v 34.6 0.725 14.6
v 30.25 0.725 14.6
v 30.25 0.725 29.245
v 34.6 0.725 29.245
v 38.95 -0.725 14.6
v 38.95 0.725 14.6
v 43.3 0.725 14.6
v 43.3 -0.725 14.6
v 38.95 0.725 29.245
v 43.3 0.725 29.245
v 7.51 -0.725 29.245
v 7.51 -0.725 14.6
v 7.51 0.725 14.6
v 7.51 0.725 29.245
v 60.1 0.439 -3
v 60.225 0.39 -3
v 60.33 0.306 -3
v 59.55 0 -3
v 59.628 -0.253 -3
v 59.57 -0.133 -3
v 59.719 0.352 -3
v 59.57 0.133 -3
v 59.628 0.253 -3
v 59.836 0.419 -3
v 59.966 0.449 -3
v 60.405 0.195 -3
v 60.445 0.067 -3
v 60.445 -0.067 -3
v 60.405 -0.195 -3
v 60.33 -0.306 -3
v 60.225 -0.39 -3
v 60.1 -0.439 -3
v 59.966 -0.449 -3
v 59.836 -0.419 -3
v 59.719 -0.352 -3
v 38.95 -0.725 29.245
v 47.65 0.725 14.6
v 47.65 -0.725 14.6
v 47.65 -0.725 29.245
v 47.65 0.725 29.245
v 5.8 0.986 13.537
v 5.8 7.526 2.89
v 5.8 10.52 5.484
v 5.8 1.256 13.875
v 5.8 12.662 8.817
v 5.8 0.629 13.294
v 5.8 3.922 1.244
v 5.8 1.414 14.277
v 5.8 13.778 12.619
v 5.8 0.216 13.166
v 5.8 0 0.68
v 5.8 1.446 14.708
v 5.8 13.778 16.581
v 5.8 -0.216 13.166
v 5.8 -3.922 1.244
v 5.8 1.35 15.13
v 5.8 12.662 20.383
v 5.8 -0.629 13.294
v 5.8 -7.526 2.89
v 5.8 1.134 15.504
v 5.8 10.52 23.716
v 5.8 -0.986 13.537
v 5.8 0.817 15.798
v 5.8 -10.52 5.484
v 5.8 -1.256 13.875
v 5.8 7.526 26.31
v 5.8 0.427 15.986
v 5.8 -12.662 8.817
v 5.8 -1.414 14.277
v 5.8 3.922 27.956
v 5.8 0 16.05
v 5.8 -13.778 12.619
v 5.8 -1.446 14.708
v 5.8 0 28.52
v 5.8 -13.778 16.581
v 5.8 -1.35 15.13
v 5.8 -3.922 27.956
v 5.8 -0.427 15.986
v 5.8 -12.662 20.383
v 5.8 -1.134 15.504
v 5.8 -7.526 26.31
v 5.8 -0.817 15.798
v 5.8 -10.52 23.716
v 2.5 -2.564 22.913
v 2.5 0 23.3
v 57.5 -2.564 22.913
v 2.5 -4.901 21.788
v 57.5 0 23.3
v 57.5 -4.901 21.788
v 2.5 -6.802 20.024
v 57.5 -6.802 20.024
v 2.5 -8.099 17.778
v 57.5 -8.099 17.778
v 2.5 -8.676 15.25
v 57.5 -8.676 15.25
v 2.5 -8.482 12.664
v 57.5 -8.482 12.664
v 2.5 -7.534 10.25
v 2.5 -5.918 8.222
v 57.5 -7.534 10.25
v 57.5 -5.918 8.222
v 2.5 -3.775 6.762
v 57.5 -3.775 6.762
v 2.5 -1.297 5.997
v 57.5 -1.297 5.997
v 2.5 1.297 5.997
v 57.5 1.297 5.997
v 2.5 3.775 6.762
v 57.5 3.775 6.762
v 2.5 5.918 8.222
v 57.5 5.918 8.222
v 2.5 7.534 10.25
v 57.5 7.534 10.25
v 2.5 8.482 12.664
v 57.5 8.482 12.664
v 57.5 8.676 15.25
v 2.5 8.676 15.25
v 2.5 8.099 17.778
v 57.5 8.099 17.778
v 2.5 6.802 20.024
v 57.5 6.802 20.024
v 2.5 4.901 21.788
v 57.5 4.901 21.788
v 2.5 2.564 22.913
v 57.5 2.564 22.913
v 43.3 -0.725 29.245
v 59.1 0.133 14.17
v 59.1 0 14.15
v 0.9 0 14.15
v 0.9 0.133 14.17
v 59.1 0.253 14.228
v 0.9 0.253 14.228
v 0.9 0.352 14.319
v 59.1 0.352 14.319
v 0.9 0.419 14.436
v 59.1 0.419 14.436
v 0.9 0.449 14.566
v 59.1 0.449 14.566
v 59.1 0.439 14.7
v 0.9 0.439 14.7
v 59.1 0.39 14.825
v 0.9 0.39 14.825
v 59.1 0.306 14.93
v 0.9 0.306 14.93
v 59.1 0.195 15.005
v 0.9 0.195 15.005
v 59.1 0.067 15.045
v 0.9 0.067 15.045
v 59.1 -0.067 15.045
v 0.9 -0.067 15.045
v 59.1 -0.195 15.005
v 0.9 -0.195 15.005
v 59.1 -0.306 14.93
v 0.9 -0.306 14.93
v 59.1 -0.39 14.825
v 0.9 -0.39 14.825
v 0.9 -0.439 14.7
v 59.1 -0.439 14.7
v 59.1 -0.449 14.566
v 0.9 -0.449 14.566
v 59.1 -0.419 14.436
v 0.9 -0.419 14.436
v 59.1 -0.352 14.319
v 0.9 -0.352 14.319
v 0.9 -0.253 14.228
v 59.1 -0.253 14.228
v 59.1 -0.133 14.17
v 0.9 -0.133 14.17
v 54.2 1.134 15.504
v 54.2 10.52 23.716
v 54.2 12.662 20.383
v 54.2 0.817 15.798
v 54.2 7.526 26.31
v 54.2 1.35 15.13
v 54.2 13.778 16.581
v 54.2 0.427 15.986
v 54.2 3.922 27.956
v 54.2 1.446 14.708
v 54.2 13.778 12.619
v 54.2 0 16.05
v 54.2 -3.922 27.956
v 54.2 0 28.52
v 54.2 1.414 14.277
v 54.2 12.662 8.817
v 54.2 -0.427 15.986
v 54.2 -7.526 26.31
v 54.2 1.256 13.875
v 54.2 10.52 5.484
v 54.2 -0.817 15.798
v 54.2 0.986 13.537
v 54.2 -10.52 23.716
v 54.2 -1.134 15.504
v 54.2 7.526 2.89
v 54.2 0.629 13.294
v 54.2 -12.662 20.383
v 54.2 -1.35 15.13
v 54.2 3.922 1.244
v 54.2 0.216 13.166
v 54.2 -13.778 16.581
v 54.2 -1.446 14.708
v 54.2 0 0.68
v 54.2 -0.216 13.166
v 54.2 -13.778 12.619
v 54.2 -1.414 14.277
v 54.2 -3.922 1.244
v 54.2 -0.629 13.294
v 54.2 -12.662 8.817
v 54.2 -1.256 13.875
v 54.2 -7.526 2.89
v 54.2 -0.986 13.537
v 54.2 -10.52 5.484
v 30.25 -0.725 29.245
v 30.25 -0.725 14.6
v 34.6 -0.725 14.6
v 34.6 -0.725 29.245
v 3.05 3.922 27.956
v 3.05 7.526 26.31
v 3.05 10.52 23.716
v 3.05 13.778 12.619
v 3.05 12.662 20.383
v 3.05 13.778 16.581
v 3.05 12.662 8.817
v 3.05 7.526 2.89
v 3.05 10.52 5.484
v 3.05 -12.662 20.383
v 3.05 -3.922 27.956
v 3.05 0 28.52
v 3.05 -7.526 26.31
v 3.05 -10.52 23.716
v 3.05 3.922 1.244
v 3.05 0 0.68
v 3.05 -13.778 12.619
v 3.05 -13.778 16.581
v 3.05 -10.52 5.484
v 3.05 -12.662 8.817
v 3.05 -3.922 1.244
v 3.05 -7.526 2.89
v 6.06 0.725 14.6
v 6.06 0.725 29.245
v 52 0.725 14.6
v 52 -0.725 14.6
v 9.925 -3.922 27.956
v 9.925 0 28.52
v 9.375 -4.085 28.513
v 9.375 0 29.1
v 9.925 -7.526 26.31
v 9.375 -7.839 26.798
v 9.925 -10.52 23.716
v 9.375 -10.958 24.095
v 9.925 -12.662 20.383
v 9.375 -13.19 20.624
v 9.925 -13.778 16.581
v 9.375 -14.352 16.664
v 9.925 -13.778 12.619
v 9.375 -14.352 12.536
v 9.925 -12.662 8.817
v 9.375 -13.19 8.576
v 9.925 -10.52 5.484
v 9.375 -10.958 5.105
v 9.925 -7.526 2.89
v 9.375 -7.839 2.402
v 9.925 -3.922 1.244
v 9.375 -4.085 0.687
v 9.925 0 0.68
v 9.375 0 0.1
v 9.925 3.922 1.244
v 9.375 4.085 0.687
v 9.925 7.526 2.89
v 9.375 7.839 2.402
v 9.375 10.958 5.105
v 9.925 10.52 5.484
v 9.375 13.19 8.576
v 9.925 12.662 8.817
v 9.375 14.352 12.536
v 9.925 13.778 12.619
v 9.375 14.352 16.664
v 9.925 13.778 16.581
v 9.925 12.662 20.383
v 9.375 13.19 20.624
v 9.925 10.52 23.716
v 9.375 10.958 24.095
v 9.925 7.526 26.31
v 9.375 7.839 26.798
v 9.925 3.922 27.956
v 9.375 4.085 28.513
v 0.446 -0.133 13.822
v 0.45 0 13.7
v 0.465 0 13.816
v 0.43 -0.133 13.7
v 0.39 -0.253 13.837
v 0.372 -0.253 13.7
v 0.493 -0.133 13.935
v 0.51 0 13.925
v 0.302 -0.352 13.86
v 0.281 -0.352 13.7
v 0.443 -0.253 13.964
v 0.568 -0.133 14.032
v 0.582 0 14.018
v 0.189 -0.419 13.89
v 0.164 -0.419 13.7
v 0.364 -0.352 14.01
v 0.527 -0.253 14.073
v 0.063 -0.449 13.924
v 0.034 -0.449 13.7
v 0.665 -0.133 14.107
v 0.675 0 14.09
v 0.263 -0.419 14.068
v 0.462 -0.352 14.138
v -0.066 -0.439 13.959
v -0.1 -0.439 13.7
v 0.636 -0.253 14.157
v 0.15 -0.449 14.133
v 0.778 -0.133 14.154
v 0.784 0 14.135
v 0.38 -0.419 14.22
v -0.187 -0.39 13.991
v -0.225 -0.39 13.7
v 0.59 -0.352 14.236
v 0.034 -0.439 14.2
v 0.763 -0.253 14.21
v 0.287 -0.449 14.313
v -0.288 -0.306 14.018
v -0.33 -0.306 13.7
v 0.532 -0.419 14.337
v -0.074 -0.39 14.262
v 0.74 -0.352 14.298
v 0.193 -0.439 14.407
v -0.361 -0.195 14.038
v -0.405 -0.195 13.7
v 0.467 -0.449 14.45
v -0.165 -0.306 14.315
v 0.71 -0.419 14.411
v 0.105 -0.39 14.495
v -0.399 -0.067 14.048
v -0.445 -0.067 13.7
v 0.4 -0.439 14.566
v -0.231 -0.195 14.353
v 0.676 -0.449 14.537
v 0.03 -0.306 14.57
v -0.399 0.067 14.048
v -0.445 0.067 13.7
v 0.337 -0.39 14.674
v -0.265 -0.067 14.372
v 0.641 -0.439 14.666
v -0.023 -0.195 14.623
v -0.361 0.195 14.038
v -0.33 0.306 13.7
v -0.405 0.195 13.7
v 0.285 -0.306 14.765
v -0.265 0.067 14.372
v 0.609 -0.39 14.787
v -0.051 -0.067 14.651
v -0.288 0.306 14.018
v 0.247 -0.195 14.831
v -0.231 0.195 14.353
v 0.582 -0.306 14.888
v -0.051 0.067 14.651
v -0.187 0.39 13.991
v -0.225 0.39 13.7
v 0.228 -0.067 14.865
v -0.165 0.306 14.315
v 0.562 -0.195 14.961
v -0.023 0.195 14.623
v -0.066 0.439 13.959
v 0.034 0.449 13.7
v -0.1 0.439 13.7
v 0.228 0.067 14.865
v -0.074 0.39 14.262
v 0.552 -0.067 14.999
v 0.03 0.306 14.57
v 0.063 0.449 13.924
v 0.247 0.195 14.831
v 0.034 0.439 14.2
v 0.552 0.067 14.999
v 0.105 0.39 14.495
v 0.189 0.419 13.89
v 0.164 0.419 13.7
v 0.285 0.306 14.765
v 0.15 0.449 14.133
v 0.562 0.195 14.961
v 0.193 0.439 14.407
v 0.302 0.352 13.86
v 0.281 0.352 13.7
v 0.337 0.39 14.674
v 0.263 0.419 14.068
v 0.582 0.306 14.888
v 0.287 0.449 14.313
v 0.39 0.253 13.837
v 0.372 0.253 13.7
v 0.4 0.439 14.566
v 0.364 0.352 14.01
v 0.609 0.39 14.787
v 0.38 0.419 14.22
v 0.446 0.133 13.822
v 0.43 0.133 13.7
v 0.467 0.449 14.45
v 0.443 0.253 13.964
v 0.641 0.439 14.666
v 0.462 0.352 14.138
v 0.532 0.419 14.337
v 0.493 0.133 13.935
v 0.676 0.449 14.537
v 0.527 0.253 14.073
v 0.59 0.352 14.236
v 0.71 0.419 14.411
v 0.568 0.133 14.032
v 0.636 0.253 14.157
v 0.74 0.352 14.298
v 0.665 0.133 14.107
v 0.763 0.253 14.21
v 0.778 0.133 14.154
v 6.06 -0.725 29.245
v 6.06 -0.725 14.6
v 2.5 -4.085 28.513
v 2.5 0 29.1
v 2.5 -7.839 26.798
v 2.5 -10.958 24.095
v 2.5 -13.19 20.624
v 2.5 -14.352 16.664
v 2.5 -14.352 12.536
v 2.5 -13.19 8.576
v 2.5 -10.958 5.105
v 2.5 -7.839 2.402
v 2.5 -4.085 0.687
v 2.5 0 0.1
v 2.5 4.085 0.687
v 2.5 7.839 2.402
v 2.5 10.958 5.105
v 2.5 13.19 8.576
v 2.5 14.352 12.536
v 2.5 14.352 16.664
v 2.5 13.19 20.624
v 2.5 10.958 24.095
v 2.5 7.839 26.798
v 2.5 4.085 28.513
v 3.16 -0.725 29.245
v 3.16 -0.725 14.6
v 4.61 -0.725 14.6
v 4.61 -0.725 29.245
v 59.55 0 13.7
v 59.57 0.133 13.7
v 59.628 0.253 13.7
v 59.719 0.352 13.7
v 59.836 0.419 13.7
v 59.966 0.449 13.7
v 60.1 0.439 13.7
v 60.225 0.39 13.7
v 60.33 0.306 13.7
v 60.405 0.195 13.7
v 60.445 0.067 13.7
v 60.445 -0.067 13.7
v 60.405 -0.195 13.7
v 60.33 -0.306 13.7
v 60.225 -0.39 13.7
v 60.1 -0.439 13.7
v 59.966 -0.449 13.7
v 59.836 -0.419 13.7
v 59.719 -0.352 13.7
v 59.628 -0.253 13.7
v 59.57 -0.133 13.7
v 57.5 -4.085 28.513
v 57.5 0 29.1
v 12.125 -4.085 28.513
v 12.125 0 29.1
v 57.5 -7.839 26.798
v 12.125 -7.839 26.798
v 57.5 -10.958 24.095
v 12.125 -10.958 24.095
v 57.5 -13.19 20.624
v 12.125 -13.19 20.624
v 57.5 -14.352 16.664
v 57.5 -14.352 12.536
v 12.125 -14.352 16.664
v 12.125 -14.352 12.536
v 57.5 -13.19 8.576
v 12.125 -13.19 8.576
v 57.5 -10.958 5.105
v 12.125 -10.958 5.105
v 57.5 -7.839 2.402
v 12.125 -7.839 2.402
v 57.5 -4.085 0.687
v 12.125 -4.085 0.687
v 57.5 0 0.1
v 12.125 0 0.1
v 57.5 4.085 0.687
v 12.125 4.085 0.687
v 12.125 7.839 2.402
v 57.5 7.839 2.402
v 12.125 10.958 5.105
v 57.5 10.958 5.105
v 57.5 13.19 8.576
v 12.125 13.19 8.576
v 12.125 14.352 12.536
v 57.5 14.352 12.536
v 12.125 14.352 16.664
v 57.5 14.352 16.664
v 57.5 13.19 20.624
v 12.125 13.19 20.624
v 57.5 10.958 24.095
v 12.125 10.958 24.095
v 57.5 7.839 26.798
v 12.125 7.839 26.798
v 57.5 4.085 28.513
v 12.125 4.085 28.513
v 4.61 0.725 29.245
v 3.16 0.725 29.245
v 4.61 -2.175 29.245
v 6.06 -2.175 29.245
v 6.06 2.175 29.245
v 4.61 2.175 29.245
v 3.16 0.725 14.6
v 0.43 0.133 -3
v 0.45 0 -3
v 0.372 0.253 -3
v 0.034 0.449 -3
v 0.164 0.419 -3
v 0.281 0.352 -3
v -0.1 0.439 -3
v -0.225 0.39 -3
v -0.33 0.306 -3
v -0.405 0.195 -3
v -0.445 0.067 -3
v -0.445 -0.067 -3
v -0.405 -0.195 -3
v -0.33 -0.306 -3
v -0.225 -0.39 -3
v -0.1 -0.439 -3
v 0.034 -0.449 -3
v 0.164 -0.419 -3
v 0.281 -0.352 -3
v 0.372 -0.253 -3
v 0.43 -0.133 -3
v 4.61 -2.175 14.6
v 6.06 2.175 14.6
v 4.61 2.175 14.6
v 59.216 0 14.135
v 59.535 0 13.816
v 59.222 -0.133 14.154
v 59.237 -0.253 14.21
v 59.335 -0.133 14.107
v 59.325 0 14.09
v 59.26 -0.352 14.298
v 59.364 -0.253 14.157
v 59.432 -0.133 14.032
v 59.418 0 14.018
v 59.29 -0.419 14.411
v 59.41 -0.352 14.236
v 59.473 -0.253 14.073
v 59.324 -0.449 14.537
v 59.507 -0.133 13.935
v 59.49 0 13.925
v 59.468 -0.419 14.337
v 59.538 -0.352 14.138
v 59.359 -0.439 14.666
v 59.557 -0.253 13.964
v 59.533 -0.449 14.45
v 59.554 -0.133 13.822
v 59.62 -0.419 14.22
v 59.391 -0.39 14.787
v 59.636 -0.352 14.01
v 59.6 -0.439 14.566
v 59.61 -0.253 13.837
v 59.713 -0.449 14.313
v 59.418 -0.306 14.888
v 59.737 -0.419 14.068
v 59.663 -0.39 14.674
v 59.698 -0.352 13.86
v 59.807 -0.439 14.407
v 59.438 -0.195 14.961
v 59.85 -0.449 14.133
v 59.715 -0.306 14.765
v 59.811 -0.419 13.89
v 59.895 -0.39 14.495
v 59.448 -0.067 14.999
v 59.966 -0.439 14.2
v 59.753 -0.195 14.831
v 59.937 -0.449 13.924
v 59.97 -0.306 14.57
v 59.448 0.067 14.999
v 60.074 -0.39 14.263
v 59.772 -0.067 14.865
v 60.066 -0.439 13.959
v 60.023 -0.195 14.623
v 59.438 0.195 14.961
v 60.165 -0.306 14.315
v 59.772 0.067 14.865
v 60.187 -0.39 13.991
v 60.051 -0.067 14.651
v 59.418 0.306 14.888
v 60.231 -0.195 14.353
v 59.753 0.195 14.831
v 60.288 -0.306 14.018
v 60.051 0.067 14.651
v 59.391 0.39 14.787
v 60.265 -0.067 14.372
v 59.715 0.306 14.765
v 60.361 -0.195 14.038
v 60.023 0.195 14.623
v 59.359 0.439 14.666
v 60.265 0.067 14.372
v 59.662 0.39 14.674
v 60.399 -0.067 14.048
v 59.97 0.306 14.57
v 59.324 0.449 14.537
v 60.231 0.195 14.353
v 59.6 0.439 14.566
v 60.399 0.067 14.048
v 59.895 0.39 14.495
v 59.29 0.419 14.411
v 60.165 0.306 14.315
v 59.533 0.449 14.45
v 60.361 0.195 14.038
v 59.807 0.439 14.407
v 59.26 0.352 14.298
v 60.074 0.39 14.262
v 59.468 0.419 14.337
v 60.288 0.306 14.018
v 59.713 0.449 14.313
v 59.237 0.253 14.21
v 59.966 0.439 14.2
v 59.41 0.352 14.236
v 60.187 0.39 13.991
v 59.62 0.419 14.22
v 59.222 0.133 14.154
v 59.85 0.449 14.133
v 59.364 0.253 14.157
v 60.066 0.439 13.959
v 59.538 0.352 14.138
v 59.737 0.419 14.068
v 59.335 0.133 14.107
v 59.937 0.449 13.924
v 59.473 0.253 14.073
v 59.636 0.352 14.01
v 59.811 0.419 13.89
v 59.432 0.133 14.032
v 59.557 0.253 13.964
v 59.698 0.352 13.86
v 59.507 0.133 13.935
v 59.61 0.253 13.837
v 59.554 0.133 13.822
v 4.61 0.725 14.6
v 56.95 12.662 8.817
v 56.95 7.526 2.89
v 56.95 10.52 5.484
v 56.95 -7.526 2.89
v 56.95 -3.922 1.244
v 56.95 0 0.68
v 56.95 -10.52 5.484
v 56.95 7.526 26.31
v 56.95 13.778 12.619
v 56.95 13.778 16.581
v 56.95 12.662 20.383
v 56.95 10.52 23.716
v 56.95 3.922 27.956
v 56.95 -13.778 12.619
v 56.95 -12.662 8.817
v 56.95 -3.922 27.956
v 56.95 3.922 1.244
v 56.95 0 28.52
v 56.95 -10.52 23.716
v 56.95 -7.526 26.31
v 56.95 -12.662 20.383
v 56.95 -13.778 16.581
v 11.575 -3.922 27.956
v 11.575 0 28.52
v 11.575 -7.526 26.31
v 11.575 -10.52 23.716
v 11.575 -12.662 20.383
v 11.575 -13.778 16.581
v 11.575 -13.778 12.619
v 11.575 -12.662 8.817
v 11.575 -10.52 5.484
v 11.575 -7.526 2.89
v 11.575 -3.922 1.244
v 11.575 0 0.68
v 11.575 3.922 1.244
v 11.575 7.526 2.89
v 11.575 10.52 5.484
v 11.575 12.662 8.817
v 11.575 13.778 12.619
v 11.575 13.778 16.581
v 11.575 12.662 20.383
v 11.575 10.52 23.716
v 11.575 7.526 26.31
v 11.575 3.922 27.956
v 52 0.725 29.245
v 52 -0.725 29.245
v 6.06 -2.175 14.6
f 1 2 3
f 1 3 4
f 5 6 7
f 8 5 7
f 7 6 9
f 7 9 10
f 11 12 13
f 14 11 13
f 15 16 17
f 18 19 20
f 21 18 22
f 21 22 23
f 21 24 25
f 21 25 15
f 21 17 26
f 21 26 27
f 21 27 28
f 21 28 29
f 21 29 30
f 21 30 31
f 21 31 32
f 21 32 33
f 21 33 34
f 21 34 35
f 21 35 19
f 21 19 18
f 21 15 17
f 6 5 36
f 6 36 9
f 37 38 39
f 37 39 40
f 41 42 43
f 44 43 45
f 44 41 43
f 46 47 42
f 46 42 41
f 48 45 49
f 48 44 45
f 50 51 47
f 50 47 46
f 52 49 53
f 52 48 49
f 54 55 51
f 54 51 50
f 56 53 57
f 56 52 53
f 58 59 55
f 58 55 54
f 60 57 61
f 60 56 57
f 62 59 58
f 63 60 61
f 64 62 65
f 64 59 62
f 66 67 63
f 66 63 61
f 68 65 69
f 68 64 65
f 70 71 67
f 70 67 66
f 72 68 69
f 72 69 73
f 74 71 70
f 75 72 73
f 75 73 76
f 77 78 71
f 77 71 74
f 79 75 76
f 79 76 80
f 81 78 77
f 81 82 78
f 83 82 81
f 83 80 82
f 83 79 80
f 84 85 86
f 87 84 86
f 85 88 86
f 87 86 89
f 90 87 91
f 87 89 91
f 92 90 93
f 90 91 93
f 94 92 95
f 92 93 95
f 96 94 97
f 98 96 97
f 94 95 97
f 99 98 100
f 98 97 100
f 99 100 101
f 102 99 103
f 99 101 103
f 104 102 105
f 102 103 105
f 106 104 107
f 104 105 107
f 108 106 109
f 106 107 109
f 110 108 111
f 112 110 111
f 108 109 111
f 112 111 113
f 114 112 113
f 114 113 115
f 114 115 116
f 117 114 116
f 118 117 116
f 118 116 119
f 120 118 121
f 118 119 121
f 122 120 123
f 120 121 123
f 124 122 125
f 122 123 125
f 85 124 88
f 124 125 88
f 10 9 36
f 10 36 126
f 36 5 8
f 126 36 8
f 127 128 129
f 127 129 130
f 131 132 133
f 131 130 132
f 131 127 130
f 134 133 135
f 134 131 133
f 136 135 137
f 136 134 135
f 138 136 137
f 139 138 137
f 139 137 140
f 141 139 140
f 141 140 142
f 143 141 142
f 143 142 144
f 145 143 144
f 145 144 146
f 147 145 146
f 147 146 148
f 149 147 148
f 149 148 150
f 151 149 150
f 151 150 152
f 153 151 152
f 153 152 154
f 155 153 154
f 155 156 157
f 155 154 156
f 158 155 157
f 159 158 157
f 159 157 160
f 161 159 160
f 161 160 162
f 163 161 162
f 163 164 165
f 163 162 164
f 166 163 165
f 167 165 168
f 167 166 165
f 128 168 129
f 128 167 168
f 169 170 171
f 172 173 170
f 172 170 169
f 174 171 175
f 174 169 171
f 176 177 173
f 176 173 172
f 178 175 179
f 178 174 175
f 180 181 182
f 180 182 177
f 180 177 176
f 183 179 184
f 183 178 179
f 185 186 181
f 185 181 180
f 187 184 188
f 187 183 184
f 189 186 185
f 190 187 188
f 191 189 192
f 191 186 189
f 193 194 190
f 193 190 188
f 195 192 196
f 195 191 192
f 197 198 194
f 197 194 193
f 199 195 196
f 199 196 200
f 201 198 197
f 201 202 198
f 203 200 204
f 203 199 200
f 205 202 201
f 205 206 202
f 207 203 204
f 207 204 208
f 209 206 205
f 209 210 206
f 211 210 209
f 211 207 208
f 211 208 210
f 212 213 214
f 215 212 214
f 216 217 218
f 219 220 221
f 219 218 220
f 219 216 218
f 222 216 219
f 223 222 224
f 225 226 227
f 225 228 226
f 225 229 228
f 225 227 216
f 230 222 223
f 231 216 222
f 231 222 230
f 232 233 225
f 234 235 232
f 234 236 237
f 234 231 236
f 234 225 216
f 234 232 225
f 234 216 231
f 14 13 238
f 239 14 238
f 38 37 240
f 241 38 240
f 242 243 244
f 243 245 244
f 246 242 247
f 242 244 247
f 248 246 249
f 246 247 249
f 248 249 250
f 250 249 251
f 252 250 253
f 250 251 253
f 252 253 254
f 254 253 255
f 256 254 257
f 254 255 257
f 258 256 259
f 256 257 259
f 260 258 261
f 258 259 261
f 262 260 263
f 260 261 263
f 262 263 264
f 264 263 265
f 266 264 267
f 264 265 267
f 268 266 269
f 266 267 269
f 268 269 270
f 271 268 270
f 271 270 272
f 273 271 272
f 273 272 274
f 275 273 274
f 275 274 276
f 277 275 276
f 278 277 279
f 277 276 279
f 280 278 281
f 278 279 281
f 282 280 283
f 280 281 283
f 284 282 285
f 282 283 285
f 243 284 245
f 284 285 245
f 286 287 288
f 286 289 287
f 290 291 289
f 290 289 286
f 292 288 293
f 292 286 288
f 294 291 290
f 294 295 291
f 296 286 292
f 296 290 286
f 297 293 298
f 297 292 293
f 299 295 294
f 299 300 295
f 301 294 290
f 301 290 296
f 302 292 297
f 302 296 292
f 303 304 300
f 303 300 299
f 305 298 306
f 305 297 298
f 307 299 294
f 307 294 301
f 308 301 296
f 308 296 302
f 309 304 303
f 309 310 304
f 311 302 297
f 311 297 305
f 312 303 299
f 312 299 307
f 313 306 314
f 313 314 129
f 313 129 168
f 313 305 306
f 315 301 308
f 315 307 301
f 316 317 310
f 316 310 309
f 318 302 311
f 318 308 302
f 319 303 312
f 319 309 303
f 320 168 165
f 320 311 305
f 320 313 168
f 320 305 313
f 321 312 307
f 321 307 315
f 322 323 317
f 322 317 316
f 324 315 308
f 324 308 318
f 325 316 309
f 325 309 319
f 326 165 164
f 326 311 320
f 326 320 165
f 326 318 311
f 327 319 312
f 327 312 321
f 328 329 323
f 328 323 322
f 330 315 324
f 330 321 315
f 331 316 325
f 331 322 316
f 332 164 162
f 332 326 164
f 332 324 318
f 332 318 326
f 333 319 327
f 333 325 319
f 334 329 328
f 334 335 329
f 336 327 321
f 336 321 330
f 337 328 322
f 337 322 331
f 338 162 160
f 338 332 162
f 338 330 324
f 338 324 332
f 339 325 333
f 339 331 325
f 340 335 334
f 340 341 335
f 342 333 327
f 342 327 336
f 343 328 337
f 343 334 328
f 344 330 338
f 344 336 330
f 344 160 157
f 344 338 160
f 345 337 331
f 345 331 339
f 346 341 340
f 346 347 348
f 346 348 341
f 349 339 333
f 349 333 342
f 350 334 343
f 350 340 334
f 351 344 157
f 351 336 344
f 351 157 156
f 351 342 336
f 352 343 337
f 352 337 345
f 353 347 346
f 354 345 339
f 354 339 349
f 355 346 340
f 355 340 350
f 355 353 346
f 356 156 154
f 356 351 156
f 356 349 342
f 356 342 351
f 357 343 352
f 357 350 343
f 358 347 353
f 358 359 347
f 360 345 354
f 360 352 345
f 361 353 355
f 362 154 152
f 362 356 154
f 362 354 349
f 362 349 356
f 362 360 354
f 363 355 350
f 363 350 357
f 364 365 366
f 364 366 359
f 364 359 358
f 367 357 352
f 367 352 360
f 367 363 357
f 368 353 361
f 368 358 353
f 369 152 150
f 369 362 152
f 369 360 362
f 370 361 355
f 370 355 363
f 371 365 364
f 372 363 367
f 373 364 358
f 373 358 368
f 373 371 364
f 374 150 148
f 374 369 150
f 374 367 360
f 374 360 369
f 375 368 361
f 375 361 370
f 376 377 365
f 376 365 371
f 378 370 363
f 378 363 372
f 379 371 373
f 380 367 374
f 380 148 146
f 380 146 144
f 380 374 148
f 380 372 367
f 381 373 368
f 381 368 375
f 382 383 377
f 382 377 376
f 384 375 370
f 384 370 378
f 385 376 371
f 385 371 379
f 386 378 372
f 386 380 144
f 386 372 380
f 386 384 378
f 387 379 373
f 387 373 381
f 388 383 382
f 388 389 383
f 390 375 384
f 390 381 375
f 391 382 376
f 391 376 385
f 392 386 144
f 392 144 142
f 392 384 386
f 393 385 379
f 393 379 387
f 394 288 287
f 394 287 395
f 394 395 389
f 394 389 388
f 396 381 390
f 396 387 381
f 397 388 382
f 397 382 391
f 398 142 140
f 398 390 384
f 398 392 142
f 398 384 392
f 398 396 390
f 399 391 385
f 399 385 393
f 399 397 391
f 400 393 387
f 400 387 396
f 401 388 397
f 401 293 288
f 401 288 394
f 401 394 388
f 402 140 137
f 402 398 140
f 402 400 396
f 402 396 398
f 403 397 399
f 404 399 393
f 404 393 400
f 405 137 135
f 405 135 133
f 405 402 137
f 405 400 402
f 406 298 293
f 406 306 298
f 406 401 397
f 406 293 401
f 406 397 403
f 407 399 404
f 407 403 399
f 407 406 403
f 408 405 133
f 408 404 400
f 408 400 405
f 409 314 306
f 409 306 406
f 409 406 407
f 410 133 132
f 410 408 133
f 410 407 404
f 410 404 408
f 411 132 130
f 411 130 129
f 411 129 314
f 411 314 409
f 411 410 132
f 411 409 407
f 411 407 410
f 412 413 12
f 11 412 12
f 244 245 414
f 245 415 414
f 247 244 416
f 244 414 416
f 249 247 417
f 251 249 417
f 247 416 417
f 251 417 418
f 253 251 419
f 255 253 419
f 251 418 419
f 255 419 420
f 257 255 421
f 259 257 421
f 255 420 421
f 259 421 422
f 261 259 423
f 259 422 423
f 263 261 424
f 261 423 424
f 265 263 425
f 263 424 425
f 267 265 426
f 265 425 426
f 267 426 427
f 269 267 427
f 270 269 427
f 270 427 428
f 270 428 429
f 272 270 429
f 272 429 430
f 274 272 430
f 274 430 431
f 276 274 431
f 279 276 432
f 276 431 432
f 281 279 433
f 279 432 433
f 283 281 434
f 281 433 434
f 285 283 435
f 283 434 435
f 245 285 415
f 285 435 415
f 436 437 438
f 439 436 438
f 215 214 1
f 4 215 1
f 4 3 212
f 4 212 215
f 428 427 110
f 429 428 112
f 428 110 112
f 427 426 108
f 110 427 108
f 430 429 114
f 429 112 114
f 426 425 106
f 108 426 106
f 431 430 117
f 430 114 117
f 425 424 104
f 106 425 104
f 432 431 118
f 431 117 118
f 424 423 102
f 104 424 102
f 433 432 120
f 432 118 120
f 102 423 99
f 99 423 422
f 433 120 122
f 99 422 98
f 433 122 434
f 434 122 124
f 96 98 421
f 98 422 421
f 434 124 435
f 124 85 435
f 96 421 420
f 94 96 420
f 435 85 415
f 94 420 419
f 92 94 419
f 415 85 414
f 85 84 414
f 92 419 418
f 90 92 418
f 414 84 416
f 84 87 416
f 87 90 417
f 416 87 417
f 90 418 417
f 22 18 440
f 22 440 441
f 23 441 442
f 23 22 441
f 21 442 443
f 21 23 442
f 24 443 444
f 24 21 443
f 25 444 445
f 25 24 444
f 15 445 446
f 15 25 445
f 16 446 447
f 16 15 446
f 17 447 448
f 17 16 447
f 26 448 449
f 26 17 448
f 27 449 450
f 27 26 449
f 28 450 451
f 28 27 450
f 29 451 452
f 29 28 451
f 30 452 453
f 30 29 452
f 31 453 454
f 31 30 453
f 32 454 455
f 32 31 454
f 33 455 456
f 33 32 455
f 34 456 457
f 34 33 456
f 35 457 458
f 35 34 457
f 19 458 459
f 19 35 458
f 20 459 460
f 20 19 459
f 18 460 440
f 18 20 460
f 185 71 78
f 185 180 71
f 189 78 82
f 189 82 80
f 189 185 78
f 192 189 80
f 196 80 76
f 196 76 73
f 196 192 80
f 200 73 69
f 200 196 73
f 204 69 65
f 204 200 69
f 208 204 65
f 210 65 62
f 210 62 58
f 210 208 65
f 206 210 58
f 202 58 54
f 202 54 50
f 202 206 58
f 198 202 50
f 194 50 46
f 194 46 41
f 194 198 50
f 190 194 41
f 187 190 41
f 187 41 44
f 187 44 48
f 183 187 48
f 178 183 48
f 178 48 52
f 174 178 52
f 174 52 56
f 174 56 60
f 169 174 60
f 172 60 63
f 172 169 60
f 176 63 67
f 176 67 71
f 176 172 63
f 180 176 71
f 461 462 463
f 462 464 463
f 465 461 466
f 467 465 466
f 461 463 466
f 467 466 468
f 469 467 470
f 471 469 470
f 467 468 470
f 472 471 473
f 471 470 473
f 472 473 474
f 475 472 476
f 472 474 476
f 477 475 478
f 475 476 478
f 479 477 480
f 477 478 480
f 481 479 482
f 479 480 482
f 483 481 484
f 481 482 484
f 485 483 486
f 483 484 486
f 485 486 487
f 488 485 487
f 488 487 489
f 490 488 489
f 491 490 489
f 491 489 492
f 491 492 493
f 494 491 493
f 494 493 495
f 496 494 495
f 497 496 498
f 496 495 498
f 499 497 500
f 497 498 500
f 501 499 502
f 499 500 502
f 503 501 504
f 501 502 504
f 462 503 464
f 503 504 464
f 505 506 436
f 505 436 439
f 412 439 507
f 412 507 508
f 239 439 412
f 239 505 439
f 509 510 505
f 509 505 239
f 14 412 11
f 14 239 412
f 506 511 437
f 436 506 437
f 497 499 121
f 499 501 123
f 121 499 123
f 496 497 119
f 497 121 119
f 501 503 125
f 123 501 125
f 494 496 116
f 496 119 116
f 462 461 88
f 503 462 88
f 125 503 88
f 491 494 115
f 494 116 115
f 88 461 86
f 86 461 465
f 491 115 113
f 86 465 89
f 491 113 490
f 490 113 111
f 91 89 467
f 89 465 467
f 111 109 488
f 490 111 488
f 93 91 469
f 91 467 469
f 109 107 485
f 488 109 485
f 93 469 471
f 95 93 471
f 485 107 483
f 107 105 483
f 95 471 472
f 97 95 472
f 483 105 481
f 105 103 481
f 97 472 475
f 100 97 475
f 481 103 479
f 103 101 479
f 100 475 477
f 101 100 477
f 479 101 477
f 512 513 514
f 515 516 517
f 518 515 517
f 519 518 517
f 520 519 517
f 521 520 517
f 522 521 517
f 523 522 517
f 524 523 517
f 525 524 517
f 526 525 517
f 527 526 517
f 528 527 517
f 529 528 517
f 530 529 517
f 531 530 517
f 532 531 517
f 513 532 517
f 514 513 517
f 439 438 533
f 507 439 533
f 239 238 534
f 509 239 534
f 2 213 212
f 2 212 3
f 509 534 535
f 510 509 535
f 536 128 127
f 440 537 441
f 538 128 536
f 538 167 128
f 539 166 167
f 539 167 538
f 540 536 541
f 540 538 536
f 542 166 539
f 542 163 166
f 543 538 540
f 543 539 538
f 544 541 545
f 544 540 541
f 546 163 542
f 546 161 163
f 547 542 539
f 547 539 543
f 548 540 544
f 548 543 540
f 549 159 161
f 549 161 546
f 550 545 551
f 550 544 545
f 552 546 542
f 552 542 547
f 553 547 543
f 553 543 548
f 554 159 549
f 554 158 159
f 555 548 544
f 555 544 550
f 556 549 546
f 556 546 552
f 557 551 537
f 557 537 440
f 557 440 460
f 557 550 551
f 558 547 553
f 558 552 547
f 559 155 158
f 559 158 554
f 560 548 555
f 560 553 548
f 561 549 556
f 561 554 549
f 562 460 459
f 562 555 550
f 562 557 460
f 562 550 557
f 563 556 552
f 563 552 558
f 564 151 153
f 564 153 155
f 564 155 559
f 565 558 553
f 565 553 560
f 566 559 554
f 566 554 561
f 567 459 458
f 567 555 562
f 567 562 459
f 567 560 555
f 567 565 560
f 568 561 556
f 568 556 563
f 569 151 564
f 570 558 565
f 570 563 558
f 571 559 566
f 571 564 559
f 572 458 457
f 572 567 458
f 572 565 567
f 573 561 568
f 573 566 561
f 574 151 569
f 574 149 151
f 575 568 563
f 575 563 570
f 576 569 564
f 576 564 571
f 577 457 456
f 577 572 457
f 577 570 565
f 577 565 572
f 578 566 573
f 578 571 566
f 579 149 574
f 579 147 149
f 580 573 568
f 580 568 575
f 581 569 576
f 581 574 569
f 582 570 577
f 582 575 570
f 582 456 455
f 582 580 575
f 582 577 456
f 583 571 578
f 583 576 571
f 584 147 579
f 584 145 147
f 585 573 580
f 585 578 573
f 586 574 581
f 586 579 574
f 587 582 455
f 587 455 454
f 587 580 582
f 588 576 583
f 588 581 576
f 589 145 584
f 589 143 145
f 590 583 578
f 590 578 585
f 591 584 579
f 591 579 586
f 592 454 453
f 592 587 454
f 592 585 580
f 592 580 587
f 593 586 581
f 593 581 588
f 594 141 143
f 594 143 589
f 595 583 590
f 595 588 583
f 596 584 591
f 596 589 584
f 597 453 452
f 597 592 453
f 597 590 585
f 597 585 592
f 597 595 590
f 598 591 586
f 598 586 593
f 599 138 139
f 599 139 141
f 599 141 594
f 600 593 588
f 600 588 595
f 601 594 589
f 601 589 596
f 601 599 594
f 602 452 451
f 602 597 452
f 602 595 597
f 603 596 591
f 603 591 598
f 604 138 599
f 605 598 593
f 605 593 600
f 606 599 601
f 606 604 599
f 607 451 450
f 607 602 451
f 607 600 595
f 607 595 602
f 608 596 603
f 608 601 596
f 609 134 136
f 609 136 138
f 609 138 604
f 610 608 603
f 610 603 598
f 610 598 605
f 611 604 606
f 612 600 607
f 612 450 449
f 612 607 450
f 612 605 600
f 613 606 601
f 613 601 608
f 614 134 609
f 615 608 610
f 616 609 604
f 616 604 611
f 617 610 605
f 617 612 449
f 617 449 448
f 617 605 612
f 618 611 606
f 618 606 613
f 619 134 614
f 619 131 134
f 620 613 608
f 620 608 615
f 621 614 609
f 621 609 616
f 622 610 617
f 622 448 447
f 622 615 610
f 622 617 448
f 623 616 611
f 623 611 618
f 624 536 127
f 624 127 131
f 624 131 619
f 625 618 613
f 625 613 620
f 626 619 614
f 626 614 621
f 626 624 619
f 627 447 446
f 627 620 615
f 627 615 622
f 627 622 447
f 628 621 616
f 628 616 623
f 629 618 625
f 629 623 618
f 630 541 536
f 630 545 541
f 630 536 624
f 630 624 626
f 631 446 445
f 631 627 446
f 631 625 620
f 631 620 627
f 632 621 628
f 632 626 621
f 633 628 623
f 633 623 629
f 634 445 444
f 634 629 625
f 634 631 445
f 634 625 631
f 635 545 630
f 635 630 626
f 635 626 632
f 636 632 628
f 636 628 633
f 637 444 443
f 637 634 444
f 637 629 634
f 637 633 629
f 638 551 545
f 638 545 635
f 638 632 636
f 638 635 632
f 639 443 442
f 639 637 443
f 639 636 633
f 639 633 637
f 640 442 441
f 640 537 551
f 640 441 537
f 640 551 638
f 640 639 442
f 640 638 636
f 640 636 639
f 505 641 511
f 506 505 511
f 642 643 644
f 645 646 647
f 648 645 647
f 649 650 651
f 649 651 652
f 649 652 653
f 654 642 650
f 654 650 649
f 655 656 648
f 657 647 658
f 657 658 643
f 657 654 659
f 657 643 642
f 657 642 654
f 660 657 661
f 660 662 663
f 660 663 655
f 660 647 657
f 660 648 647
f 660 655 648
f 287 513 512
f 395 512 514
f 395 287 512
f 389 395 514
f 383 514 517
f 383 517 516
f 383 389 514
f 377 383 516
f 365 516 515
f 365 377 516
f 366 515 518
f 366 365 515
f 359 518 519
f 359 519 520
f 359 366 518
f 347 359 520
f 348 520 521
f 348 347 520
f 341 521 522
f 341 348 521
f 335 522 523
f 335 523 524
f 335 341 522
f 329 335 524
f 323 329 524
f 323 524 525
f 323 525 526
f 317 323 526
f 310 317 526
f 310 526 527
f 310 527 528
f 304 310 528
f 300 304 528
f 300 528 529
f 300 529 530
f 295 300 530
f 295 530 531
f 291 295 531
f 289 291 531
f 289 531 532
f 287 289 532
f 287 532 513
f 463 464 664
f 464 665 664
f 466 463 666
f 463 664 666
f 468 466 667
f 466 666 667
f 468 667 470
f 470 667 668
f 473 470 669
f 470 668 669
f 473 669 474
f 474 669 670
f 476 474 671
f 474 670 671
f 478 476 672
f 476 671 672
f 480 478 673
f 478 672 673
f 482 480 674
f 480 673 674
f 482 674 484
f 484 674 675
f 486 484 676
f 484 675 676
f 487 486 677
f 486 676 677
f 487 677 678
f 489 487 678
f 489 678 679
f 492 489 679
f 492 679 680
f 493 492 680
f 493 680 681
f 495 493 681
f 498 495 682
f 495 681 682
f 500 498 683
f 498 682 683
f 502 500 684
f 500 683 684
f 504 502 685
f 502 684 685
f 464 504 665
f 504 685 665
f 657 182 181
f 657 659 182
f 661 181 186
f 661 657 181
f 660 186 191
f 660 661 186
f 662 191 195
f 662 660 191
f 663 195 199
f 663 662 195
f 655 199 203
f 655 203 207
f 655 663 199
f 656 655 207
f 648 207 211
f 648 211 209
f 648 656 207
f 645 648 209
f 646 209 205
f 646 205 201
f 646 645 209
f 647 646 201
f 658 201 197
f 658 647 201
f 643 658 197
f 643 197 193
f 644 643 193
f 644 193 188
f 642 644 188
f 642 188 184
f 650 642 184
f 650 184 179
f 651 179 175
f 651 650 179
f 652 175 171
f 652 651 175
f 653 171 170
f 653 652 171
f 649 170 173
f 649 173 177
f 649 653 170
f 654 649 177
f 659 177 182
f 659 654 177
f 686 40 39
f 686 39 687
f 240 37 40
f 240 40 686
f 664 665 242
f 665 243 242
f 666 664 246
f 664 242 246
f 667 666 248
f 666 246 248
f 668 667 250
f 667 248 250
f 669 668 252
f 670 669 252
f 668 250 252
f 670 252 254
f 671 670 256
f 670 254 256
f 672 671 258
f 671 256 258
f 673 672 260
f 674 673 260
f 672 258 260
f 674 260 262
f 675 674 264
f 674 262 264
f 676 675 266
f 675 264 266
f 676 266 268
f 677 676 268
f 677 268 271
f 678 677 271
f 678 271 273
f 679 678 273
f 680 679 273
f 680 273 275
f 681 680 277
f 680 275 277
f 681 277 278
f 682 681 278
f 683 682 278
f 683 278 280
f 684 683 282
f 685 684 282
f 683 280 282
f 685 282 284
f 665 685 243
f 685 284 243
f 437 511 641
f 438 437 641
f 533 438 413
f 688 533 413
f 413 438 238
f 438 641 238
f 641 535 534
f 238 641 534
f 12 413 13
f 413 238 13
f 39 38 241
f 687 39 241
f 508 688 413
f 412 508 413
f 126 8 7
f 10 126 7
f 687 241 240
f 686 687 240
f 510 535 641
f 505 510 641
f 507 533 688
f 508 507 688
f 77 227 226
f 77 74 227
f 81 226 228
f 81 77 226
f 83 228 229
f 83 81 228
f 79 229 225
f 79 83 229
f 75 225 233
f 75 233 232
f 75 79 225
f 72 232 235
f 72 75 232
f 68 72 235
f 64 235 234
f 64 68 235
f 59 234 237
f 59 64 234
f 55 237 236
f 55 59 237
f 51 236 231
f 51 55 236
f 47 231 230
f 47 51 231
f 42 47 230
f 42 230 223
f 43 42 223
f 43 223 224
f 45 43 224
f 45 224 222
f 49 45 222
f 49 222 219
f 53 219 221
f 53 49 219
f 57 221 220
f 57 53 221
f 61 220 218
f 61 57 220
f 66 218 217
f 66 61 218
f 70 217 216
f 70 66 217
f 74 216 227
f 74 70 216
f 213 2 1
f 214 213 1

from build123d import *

# Parameters (mm, degrees)
SKETCH_R    = 0.45
SKETCH004_W = 4.35
SKETCH004_H = 1.45
PAD_DEPTH   = 14.645


with BuildPart() as sweep_body:
    # Sweep: sweep along a path in Sketch001
    with BuildLine(Plane.XZ) as sweep_path:
        Line((0, -3), (0, 13.7))
        ThreePointArc((0, 13.7), (0.263601, 14.336393), (0.899993, 14.6))
        Line((0.899993, 14.6), (59.1, 14.6))
        ThreePointArc((59.1, 14.6), (59.736396, 14.336396), (60, 13.7))
        Line((60, 13.7), (60, -3))
    # Sketch → Sweep (sweep)
    with BuildSketch(Plane.XY.offset(-2)):
        Circle(SKETCH_R)
    sweep(path=sweep_path.line)


with BuildPart() as revolution:
    # Sketch002 → Revolution (revolve)
    with BuildSketch(Plane.XZ):
        Polygon((2.5, 29.1), (2.5, 23.3), (57.5, 23.3), (57.5, 29.1), (12.125, 29.1), (11.575, 28.52), (9.925, 28.52), (9.375, 29.1), align=None)
    revolve(axis=Axis((6.97588, 0, 14.6), (1, 0, 0)))


with BuildPart() as revolution001:
    # Sketch003 → Revolution001 (revolve)
    with BuildSketch(Plane.XZ):
        Polygon((3.05, 28.52), (5.8, 28.52), (5.8, 16.05), (54.2, 16.05), (54.2, 28.52), (56.95, 28.52), (56.95, 14.6), (3.05, 14.6), align=None)
    revolve(axis=Axis((6.97588, 0, 14.6), (1, 0, 0)))


with BuildPart() as pad:
    # Sketch004 → Pad (new body)
    with BuildSketch(Plane.XY.offset(14.6)):
        with Locations((49.825, 0)):
            Rectangle(SKETCH004_W, SKETCH004_H)
        with Locations((41.125, 0)):
            Rectangle(SKETCH004_W, SKETCH004_H)
        with Locations((32.425, 0)):
            Rectangle(SKETCH004_W, SKETCH004_H)
        Polygon((4.61, 0.725), (3.16, 0.725), (3.16, -0.725), (4.61, -0.725), (4.61, -2.175), (6.06, -2.175), (6.06, -0.725), (7.51, -0.725), (7.51, 0.725), (6.06, 0.725), (6.06, 2.175), (4.61, 2.175), align=None)
    extrude(amount=PAD_DEPTH)


solid = Compound([sweep_body.part, revolution.part, revolution001.part, pad.part])
